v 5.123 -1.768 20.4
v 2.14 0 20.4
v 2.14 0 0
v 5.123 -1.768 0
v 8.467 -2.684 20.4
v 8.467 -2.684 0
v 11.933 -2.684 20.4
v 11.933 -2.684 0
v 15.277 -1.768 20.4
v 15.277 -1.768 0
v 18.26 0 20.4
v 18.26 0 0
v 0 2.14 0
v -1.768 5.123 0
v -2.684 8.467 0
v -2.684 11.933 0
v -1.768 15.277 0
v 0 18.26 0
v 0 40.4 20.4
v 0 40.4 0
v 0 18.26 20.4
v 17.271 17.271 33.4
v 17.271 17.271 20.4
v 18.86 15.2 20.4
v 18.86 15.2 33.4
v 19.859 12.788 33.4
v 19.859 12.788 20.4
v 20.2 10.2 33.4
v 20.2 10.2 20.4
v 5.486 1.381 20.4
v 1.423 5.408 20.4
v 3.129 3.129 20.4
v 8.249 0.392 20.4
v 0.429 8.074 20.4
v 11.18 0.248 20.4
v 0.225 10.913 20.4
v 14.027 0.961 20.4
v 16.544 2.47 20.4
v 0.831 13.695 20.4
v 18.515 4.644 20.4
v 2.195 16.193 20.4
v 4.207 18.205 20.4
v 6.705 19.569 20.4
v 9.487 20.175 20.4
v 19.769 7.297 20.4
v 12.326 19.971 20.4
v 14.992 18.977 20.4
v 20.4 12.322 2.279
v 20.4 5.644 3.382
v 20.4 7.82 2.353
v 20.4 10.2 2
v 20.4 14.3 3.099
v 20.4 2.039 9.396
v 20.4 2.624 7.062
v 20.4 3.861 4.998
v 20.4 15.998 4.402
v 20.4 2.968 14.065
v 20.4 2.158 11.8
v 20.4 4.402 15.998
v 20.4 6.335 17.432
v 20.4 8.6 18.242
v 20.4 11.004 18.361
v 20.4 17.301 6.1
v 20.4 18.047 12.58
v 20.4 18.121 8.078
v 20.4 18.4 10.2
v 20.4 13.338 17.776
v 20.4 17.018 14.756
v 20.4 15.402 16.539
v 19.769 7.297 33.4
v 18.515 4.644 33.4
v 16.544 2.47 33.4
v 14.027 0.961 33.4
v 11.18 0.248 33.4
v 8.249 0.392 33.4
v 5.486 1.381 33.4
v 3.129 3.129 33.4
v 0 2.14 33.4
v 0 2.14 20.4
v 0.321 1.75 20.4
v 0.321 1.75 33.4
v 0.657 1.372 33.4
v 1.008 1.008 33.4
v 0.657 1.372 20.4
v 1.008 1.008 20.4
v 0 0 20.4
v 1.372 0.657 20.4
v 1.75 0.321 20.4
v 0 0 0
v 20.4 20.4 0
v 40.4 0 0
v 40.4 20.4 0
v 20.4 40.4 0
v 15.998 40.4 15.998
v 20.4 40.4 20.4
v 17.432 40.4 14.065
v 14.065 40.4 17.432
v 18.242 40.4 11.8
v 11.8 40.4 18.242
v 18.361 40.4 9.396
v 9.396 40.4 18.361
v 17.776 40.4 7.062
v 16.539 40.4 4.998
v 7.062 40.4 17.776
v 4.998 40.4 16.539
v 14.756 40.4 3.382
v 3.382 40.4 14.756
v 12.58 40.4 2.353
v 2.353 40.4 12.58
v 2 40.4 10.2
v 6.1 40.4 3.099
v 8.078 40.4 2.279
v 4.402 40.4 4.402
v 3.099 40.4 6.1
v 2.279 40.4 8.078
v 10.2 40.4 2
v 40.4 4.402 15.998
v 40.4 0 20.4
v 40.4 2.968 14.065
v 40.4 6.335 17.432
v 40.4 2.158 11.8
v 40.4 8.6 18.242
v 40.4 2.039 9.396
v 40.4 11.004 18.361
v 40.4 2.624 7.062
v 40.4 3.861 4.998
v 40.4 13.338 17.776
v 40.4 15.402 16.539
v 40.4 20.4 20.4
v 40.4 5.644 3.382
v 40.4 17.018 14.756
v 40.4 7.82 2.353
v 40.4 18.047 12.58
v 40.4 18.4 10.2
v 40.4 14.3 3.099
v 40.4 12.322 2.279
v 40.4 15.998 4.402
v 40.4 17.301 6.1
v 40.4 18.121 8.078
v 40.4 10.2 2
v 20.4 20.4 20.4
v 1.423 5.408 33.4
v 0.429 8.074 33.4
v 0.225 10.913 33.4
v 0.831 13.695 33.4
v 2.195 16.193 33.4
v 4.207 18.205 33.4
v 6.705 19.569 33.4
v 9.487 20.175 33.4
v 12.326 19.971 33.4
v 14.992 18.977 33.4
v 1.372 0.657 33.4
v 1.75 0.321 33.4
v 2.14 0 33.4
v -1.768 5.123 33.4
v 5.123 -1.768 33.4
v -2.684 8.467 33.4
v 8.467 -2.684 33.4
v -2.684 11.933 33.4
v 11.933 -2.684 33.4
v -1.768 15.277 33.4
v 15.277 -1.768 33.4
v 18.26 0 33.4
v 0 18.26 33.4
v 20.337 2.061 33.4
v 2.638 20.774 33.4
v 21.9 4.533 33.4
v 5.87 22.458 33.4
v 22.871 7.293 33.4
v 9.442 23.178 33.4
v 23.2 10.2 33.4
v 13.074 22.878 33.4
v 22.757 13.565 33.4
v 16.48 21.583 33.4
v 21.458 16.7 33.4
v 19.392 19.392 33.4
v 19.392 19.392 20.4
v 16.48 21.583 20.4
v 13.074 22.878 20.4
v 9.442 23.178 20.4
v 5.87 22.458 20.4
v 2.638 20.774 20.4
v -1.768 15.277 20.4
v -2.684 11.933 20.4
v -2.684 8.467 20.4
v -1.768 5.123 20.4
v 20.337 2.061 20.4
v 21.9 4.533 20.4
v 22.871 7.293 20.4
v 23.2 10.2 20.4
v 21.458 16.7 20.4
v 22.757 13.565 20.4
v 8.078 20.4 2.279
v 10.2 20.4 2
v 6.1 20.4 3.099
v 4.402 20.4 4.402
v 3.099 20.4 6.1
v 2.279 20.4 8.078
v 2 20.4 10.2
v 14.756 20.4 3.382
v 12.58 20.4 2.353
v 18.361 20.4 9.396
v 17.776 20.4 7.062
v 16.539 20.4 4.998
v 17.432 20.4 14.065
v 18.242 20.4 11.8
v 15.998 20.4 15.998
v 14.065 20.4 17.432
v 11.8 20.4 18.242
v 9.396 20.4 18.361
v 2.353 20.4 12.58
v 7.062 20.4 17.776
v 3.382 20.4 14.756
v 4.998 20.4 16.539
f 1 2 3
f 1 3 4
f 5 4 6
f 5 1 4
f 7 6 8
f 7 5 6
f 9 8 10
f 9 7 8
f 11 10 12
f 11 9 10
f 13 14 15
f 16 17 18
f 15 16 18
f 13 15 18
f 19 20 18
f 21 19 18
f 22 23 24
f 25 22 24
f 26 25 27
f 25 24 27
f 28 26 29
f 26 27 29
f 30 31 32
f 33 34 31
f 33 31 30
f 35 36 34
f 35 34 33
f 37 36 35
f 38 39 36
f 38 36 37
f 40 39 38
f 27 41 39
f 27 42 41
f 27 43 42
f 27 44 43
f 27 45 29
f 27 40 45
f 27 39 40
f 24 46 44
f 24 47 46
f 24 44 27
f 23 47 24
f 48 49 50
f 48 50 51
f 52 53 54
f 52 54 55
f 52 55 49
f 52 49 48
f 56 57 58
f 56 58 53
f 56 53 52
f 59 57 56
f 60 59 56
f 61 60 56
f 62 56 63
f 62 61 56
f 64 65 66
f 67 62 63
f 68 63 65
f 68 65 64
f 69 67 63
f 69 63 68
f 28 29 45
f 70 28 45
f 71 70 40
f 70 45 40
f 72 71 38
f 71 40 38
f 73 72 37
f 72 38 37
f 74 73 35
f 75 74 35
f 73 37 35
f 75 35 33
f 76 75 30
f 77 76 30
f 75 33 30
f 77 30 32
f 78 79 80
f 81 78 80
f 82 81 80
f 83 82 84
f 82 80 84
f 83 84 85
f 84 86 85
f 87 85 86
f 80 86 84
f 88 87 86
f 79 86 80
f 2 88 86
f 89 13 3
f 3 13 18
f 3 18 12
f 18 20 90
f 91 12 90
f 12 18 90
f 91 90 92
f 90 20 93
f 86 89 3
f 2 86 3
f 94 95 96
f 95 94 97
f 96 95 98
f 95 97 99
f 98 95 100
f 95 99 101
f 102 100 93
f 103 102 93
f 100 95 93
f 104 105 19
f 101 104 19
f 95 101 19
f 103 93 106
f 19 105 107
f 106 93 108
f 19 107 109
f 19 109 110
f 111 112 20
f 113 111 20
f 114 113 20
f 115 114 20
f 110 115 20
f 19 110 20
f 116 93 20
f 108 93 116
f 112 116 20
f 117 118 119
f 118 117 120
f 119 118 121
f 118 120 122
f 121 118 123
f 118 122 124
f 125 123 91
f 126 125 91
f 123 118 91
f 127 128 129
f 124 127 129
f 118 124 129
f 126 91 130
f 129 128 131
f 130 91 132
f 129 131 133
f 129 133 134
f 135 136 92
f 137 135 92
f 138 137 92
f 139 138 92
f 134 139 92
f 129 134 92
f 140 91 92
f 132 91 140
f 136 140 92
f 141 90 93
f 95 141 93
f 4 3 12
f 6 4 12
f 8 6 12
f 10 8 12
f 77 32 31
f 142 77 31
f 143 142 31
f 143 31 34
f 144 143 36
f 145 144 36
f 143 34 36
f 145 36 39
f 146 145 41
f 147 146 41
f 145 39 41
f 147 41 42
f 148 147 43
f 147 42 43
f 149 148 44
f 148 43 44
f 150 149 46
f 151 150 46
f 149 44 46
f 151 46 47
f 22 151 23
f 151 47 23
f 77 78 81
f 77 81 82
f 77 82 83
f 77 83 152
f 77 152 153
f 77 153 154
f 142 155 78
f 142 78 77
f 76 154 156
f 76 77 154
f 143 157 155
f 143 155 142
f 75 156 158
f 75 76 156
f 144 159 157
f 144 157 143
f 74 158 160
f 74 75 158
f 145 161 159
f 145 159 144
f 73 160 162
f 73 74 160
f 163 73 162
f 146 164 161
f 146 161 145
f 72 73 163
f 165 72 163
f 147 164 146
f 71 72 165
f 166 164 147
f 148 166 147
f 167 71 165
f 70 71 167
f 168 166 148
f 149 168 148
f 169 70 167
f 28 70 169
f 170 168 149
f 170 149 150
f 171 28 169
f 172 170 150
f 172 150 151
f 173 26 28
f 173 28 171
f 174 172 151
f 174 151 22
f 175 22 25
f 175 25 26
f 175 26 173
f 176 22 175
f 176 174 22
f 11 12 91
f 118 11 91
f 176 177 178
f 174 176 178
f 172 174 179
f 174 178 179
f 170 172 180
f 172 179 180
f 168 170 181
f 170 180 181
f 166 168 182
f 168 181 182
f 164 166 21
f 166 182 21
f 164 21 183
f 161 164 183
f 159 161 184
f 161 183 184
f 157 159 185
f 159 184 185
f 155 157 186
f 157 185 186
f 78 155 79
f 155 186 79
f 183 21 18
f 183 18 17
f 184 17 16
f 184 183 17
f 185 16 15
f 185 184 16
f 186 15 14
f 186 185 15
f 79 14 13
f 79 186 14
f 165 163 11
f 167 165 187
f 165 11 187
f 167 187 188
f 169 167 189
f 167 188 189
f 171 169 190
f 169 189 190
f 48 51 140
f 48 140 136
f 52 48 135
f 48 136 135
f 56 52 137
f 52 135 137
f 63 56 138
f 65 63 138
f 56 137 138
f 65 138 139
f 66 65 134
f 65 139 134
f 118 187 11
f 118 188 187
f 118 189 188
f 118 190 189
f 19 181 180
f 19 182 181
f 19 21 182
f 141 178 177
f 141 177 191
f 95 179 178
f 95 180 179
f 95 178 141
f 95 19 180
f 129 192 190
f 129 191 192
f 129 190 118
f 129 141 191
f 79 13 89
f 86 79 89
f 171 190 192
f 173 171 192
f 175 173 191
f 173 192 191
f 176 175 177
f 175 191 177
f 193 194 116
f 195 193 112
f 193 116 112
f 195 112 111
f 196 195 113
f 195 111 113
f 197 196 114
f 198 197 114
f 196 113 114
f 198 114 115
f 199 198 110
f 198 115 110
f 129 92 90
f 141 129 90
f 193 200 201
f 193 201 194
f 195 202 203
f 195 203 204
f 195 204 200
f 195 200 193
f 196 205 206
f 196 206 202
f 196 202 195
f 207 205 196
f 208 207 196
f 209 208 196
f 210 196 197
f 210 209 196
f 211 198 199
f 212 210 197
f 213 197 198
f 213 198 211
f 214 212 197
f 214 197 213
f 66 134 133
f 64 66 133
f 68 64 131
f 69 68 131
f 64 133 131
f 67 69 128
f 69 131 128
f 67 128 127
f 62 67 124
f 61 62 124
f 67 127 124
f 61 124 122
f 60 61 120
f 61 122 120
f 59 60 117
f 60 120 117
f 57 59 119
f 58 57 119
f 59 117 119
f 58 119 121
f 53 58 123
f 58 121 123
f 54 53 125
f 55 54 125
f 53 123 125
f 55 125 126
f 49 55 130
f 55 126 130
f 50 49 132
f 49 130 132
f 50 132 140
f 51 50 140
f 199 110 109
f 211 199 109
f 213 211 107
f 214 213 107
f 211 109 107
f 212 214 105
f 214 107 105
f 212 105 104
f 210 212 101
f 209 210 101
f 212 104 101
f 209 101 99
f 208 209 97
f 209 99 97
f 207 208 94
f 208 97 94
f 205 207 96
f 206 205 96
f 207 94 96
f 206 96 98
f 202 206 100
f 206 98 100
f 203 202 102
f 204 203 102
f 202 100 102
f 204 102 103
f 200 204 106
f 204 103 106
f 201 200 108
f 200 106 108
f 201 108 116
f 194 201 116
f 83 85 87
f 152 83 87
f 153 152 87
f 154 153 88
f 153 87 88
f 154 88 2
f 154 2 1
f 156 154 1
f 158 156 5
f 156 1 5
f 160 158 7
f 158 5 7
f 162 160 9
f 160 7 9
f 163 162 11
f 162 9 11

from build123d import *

# Parameters (mm, degrees)
F1_DEPTH = 20.4
F4_DEPTH = 20
F5_DEPTH = 20
F7_DEPTH = 13
F8_DEPTH = 20.4
F9_DEPTH = 20.4


with BuildPart() as f1:
    # F0 (on Top) → F1 (new body)
    with BuildSketch(Plane.XY):
        Polygon((0, 40.4), (0, 0), (40.4, 0), (40.4, 20.4), (20.4, 20.4), (20.4, 40.4), align=None)
    extrude(amount=F1_DEPTH)

    # F3 (on face) → F4 (cut)
    with BuildSketch(Plane(origin=(0, 40.4, 0), x_dir=(-1, 0, 0), z_dir=(0, 1, 0))):
        with BuildLine():
            Line((-10.2, 10.2), (-2, 10.2))
            ThreePointArc((-2, 10.2), (-15.9982756057, 15.9982756057), (-10.2, 2))
            Line((-10.2, 2), (-10.2, 10.2))
        make_face()
        with BuildLine():
            ThreePointArc((-10.2, 2), (-4.4017243943, 4.4017243943), (-2, 10.2))
            Line((-2, 10.2), (-10.2, 10.2))
            Line((-10.2, 10.2), (-10.2, 2))
        make_face()
    extrude(amount=-F4_DEPTH, mode=Mode.SUBTRACT)

    # F2 (on face) → F5 (cut)
    with BuildSketch(Plane.YZ.offset(40.4)):
        with BuildLine():
            ThreePointArc((10.2, 2), (15.9982756057, 4.4017243943), (18.4, 10.2))
            Line((18.4, 10.2), (10.2, 10.2))
            Line((10.2, 10.2), (10.2, 2))
        make_face()
        with BuildLine():
            Line((10.2, 10.2), (18.4, 10.2))
            ThreePointArc((18.4, 10.2), (4.4017243943, 15.9982756057), (10.2, 2))
            Line((10.2, 2), (10.2, 10.2))
        make_face()
    extrude(amount=-F5_DEPTH, mode=Mode.SUBTRACT)

    # F6 (on face) → F7 (join)
    with BuildSketch(Plane.XY.offset(20.4)):
        with BuildLine():
            Line((18.2597766718, 0), (2.1402233282, 0))
            ThreePointArc((2.1402233282, 0), (10.2, -2.8), (18.2597766718, 0))
        make_face()
        with BuildLine():
            ThreePointArc((0, 18.2597766718), (-2.8, 10.2), (0, 2.1402233282))
            Line((0, 2.1402233282), (0, 18.2597766718))
        make_face()
        with BuildLine():
            Line((3.1289321881, 3.1289321881), (1.0076118446, 1.0076118446))
            ThreePointArc((1.0076118446, 1.0076118446), (1.5592177314, 0.4872824716), (2.1402233282, 0))
            Line((2.1402233282, 0), (18.2597766718, 0))
            ThreePointArc((18.2597766718, 0), (21.8999379642, 4.5333032874), (23.2, 10.2))
            ThreePointArc((23.2, 10.2), (22.2104339226, 15.1748846207), (19.3923881554, 19.3923881554))
            Line((19.3923881554, 19.3923881554), (17.2710678119, 17.2710678119))
            ThreePointArc((17.2710678119, 17.2710678119), (19.4387953251, 14.0268343237), (20.2, 10.2))
            ThreePointArc((20.2, 10.2), (14.0268343237, 0.9612046749), (3.1289321881, 3.1289321881))
        make_face()
        with BuildLine():
            ThreePointArc((0, 2.1402233282), (0.4872824716, 1.5592177314), (1.0076118446, 1.0076118446))
            Line((1.0076118446, 1.0076118446), (3.1289321881, 3.1289321881))
            ThreePointArc((3.1289321881, 3.1289321881), (3.1289321881, 17.2710678119), (17.2710678119, 17.2710678119))
            Line((17.2710678119, 17.2710678119), (19.3923881554, 19.3923881554))
            ThreePointArc((19.3923881554, 19.3923881554), (9.4420273089, 23.177884165), (0, 18.2597766718))
            Line((0, 18.2597766718), (0, 2.1402233282))
        make_face()
    extrude(amount=F7_DEPTH)

    # F6 (on face) → F8 (join)
    with BuildSketch(Plane.XY.offset(20.4)):
        with BuildLine():
            Line((18.2597766718, 0), (2.1402233282, 0))
            ThreePointArc((2.1402233282, 0), (10.2, -2.8), (18.2597766718, 0))
        make_face()
    extrude(amount=-F8_DEPTH)

    # F6 (on face) → F9 (join)
    with BuildSketch(Plane.XY.offset(20.4)):
        with BuildLine():
            ThreePointArc((0, 18.2597766718), (-2.8, 10.2), (0, 2.1402233282))
            Line((0, 2.1402233282), (0, 18.2597766718))
        make_face()
    extrude(amount=-F9_DEPTH)


solid = f1.part
